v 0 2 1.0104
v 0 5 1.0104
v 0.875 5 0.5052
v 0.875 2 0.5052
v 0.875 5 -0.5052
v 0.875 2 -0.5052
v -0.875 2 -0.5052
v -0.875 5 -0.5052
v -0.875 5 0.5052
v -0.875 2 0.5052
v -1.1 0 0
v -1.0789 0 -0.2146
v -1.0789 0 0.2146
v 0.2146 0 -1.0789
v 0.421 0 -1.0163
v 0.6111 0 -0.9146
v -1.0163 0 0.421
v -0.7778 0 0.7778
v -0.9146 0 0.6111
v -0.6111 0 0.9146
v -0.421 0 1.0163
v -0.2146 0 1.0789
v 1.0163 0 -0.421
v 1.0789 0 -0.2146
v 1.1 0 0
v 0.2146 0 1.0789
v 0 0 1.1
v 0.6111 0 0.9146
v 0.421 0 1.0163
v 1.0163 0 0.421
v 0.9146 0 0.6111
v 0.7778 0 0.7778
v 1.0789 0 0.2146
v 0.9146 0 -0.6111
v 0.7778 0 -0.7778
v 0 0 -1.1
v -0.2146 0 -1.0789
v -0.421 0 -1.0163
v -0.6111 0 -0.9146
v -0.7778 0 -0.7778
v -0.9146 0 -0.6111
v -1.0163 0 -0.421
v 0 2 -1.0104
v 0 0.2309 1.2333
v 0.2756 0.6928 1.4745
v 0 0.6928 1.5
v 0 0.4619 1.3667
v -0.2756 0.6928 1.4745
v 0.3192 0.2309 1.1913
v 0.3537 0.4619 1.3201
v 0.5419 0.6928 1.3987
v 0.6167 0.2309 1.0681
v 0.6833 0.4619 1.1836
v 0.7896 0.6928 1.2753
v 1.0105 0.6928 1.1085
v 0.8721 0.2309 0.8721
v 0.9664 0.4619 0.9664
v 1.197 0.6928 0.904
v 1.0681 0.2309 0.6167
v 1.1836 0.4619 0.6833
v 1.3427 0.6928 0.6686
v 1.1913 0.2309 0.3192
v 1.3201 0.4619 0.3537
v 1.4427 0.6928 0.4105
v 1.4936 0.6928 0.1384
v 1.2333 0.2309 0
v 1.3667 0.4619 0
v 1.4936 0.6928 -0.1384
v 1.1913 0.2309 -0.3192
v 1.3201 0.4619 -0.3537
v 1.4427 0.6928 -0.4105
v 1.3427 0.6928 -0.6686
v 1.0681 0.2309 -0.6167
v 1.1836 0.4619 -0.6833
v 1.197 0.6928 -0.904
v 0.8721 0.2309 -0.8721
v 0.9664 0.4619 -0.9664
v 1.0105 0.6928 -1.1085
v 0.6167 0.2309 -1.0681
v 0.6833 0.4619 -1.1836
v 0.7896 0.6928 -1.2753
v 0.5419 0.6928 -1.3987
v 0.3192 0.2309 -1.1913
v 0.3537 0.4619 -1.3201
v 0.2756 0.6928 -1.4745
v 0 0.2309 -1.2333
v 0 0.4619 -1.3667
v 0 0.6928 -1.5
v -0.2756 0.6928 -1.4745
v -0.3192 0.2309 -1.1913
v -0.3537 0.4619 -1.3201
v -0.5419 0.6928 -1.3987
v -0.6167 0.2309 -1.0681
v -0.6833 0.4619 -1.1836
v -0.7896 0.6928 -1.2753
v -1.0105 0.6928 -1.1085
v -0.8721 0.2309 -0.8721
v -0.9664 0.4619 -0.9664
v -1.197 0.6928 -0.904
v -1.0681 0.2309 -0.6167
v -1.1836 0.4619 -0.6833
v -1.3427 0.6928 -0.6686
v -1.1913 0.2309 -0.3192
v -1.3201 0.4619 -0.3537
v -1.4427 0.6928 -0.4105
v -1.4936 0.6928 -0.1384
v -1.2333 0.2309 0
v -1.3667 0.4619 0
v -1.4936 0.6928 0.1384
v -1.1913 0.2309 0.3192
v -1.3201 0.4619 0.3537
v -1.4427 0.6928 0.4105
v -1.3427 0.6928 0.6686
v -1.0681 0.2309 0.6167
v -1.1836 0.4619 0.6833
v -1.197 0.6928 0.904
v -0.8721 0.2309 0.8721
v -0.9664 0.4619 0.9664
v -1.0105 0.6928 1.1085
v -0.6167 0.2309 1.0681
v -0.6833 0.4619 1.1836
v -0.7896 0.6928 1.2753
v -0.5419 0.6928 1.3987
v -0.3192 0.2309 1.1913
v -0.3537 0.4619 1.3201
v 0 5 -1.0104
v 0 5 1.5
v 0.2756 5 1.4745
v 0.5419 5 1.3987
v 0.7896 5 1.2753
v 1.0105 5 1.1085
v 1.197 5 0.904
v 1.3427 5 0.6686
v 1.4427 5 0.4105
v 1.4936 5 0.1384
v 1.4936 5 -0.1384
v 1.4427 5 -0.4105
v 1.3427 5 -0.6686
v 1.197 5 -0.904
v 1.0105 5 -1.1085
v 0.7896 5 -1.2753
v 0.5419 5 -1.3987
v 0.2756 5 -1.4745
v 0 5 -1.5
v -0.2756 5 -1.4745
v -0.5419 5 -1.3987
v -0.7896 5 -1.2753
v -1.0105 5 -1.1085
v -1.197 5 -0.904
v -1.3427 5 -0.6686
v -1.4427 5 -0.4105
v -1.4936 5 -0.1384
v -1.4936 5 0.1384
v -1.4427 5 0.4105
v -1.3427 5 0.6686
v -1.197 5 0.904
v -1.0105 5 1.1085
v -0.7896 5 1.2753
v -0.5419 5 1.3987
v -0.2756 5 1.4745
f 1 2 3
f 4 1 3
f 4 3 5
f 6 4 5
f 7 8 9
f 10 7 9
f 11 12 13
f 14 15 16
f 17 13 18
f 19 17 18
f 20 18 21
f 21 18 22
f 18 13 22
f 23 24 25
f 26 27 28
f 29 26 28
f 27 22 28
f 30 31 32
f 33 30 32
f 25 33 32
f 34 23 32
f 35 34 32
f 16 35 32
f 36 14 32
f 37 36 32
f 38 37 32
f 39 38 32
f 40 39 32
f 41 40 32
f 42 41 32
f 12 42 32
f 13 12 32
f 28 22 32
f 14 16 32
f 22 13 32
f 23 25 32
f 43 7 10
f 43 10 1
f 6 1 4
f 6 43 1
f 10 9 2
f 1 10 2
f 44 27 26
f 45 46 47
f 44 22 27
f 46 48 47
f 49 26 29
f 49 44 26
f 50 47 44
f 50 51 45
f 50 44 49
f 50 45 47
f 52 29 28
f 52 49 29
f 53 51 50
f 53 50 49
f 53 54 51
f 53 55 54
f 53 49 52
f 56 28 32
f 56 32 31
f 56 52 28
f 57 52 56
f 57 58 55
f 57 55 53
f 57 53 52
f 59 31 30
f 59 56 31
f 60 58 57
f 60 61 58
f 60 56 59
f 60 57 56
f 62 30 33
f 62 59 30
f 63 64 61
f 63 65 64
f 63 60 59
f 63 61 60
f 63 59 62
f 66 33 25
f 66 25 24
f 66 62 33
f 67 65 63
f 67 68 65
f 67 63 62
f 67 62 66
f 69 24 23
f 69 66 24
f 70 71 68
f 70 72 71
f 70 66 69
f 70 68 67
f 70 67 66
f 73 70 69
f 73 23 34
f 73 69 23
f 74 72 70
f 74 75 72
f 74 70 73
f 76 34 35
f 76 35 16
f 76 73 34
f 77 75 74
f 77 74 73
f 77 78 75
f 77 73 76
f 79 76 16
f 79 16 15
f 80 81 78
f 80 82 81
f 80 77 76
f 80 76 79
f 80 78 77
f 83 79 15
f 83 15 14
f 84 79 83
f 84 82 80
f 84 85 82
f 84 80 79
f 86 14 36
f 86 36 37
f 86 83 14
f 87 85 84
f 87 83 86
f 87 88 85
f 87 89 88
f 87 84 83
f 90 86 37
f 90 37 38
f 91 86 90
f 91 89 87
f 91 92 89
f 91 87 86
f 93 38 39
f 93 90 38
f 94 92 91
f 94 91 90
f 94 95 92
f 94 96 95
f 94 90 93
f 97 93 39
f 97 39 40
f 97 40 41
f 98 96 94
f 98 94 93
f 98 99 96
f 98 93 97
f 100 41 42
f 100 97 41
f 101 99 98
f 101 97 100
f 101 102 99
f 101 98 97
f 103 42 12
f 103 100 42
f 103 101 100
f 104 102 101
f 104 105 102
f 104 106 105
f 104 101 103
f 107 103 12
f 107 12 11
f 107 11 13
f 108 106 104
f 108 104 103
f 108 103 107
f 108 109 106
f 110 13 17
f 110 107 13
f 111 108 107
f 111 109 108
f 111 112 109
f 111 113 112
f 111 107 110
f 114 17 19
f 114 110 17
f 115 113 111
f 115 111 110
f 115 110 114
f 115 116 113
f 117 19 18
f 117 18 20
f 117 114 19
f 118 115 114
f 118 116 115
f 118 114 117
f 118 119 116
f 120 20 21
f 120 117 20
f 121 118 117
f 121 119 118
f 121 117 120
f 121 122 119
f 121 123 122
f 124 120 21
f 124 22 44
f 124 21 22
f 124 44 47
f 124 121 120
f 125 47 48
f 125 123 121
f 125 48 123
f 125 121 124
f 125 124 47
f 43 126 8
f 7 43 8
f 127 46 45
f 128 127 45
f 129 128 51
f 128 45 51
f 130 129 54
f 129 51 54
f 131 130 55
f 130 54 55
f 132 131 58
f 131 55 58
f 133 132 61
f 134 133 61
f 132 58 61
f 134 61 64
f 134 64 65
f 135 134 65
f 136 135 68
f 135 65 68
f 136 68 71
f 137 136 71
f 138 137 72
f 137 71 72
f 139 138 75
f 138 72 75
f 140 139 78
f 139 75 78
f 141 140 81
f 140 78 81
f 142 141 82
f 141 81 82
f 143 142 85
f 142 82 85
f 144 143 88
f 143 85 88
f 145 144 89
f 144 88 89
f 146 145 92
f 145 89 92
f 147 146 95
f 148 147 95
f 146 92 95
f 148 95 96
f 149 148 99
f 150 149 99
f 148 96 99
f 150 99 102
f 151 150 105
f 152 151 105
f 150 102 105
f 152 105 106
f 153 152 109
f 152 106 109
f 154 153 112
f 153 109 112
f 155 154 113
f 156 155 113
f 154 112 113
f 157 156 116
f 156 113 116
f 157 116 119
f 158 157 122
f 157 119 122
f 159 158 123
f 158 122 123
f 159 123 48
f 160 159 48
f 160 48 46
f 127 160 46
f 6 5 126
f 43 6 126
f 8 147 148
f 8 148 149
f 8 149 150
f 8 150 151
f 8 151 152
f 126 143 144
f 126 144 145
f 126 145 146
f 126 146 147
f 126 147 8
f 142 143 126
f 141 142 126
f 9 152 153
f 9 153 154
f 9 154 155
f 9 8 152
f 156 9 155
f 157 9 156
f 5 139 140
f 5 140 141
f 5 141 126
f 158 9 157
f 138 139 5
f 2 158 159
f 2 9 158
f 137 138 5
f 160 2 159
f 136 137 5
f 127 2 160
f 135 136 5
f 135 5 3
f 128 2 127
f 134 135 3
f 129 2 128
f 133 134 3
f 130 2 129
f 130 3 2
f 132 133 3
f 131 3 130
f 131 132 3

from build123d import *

# Parameters (mm, degrees)
SKETCH1_R           = 1.5
BOSS_EXTRUDE1_DEPTH = 5
CHAMFER1_SIZE       = 0.4
CHAMFER1_SIZE2      = 0.692820323
CUT_EXTRUDE1_DEPTH  = 3


with BuildPart() as part:
    # Sketch1 → Boss-Extrude1 (new body)
    with BuildSketch(Plane(origin=(0, 0, 0), x_dir=(1, 0, 0), z_dir=(0, 1, 0))):
        with Locations(Location((0, 0, 0), (0, 0, 270))):
            Circle(SKETCH1_R)
    extrude(amount=BOSS_EXTRUDE1_DEPTH)

    # Chamfer1
    chamfer1_edges = [part.edges().sort_by_distance(p)[0] for p in [
        (0, 0, -1.5),
    ]]
    chamfer1_side = [part.faces().sort_by_distance(p)[0] for p in [
        (0, 0, 0),
    ]]
    chamfer(chamfer1_edges, length=CHAMFER1_SIZE, length2=CHAMFER1_SIZE2, reference=chamfer1_side[0])

    # Sketch2 → Cut-Extrude1 (cut)
    with BuildSketch(Plane(origin=(0, 5, 0), x_dir=(1, 0, 0), z_dir=(0, 1, 0))):
        Polygon((0.875, -0.505181486), (0.875, 0.505181486), (0, 1.010362971), (-0.875, 0.505181486), (-0.875, -0.505181486), (0, -1.010362971), align=None)
    extrude(amount=-CUT_EXTRUDE1_DEPTH, mode=Mode.SUBTRACT)


solid = part.part
